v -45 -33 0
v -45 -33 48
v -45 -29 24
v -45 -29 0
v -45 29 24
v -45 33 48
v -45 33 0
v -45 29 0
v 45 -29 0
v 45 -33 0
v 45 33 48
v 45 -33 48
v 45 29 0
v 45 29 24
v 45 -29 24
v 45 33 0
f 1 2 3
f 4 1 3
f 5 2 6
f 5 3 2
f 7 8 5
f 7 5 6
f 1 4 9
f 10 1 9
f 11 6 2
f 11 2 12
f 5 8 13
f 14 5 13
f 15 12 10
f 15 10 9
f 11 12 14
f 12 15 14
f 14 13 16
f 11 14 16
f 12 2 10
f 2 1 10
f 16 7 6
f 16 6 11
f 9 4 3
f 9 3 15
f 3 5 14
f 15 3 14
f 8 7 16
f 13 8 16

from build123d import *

# Parameters (mm, degrees)
SKETCH_1_W      = 90
SKETCH_1_H      = 4
EXTRUDE_1_DEPTH = 24
SKETCH_2_W      = 90
SKETCH_2_H      = 4
EXTRUDE_2_DEPTH = 24
SKETCH_3_W      = 90
SKETCH_3_H      = 66
EXTRUDE_3_DEPTH = 24


with BuildPart() as part:
    # 草图1 → 凸台-拉伸1 (new body)
    with BuildSketch(Plane.XY):
        with Locations((0, 31)):
            Rectangle(SKETCH_1_W, SKETCH_1_H)
    extrude(amount=EXTRUDE_1_DEPTH)



with BuildPart() as body_2:
    # 草图2 → 凸台-拉伸2 (new body)
    with BuildSketch(Plane.XY):
        with Locations((0, -31)):
            Rectangle(SKETCH_2_W, SKETCH_2_H)
    extrude(amount=EXTRUDE_2_DEPTH)


with BuildPart() as part_1:
    add(part.part)

    add(body_2.part)  # 凸台-拉伸3 merges body 2
    # 草图3 → 凸台-拉伸3 (add)
    with BuildSketch(Plane.XY.offset(24)):
        Rectangle(SKETCH_3_W, SKETCH_3_H)
    extrude(amount=EXTRUDE_3_DEPTH)


solid = part_1.part
